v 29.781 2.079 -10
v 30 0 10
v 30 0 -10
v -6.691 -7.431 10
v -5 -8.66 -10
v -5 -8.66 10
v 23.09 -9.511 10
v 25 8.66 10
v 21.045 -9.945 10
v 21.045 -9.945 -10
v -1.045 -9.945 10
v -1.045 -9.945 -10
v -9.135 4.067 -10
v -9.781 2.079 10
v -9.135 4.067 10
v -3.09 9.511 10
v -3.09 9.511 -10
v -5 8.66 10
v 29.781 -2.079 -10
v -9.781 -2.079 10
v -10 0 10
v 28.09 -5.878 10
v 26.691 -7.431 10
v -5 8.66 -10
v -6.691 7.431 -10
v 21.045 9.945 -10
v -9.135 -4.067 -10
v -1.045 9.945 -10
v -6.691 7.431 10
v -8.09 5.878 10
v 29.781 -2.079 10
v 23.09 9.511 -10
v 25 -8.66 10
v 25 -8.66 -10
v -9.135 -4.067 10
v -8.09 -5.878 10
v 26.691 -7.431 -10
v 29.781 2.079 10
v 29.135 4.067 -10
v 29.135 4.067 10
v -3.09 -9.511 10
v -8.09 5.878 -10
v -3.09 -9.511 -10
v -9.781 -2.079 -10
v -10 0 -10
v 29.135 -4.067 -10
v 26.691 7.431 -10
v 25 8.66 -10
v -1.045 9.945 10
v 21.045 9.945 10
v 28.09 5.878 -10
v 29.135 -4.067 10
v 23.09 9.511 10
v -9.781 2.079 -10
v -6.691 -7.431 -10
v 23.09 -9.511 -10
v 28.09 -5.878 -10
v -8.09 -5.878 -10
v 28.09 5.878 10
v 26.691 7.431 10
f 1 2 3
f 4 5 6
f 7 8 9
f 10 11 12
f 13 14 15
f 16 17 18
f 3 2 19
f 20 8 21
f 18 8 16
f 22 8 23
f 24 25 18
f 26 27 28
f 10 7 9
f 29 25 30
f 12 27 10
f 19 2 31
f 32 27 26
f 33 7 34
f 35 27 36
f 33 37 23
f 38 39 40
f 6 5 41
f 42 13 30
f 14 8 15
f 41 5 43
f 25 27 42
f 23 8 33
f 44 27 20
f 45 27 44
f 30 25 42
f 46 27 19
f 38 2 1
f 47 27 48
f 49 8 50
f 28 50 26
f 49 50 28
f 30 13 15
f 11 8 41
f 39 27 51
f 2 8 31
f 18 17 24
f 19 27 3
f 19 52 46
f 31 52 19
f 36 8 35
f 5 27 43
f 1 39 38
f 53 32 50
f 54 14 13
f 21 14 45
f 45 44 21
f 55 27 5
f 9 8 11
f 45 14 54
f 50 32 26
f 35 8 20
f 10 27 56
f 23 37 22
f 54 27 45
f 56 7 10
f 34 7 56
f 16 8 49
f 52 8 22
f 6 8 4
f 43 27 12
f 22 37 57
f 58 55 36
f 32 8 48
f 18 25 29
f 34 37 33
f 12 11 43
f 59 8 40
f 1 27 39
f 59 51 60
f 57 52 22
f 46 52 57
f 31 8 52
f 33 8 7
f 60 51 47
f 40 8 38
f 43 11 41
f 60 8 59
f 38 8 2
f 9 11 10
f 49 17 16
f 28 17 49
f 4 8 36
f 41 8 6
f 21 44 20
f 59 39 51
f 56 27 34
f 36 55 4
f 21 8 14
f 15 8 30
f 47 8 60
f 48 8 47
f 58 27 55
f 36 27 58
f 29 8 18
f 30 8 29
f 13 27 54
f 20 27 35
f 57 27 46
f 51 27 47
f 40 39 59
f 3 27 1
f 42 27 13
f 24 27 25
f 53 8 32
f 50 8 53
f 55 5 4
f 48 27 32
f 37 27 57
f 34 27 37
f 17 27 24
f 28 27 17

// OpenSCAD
hull(){cylinder(  20,   10, 10,true);translate([20,0]) cylinder(  20,   10, 10,true);}
